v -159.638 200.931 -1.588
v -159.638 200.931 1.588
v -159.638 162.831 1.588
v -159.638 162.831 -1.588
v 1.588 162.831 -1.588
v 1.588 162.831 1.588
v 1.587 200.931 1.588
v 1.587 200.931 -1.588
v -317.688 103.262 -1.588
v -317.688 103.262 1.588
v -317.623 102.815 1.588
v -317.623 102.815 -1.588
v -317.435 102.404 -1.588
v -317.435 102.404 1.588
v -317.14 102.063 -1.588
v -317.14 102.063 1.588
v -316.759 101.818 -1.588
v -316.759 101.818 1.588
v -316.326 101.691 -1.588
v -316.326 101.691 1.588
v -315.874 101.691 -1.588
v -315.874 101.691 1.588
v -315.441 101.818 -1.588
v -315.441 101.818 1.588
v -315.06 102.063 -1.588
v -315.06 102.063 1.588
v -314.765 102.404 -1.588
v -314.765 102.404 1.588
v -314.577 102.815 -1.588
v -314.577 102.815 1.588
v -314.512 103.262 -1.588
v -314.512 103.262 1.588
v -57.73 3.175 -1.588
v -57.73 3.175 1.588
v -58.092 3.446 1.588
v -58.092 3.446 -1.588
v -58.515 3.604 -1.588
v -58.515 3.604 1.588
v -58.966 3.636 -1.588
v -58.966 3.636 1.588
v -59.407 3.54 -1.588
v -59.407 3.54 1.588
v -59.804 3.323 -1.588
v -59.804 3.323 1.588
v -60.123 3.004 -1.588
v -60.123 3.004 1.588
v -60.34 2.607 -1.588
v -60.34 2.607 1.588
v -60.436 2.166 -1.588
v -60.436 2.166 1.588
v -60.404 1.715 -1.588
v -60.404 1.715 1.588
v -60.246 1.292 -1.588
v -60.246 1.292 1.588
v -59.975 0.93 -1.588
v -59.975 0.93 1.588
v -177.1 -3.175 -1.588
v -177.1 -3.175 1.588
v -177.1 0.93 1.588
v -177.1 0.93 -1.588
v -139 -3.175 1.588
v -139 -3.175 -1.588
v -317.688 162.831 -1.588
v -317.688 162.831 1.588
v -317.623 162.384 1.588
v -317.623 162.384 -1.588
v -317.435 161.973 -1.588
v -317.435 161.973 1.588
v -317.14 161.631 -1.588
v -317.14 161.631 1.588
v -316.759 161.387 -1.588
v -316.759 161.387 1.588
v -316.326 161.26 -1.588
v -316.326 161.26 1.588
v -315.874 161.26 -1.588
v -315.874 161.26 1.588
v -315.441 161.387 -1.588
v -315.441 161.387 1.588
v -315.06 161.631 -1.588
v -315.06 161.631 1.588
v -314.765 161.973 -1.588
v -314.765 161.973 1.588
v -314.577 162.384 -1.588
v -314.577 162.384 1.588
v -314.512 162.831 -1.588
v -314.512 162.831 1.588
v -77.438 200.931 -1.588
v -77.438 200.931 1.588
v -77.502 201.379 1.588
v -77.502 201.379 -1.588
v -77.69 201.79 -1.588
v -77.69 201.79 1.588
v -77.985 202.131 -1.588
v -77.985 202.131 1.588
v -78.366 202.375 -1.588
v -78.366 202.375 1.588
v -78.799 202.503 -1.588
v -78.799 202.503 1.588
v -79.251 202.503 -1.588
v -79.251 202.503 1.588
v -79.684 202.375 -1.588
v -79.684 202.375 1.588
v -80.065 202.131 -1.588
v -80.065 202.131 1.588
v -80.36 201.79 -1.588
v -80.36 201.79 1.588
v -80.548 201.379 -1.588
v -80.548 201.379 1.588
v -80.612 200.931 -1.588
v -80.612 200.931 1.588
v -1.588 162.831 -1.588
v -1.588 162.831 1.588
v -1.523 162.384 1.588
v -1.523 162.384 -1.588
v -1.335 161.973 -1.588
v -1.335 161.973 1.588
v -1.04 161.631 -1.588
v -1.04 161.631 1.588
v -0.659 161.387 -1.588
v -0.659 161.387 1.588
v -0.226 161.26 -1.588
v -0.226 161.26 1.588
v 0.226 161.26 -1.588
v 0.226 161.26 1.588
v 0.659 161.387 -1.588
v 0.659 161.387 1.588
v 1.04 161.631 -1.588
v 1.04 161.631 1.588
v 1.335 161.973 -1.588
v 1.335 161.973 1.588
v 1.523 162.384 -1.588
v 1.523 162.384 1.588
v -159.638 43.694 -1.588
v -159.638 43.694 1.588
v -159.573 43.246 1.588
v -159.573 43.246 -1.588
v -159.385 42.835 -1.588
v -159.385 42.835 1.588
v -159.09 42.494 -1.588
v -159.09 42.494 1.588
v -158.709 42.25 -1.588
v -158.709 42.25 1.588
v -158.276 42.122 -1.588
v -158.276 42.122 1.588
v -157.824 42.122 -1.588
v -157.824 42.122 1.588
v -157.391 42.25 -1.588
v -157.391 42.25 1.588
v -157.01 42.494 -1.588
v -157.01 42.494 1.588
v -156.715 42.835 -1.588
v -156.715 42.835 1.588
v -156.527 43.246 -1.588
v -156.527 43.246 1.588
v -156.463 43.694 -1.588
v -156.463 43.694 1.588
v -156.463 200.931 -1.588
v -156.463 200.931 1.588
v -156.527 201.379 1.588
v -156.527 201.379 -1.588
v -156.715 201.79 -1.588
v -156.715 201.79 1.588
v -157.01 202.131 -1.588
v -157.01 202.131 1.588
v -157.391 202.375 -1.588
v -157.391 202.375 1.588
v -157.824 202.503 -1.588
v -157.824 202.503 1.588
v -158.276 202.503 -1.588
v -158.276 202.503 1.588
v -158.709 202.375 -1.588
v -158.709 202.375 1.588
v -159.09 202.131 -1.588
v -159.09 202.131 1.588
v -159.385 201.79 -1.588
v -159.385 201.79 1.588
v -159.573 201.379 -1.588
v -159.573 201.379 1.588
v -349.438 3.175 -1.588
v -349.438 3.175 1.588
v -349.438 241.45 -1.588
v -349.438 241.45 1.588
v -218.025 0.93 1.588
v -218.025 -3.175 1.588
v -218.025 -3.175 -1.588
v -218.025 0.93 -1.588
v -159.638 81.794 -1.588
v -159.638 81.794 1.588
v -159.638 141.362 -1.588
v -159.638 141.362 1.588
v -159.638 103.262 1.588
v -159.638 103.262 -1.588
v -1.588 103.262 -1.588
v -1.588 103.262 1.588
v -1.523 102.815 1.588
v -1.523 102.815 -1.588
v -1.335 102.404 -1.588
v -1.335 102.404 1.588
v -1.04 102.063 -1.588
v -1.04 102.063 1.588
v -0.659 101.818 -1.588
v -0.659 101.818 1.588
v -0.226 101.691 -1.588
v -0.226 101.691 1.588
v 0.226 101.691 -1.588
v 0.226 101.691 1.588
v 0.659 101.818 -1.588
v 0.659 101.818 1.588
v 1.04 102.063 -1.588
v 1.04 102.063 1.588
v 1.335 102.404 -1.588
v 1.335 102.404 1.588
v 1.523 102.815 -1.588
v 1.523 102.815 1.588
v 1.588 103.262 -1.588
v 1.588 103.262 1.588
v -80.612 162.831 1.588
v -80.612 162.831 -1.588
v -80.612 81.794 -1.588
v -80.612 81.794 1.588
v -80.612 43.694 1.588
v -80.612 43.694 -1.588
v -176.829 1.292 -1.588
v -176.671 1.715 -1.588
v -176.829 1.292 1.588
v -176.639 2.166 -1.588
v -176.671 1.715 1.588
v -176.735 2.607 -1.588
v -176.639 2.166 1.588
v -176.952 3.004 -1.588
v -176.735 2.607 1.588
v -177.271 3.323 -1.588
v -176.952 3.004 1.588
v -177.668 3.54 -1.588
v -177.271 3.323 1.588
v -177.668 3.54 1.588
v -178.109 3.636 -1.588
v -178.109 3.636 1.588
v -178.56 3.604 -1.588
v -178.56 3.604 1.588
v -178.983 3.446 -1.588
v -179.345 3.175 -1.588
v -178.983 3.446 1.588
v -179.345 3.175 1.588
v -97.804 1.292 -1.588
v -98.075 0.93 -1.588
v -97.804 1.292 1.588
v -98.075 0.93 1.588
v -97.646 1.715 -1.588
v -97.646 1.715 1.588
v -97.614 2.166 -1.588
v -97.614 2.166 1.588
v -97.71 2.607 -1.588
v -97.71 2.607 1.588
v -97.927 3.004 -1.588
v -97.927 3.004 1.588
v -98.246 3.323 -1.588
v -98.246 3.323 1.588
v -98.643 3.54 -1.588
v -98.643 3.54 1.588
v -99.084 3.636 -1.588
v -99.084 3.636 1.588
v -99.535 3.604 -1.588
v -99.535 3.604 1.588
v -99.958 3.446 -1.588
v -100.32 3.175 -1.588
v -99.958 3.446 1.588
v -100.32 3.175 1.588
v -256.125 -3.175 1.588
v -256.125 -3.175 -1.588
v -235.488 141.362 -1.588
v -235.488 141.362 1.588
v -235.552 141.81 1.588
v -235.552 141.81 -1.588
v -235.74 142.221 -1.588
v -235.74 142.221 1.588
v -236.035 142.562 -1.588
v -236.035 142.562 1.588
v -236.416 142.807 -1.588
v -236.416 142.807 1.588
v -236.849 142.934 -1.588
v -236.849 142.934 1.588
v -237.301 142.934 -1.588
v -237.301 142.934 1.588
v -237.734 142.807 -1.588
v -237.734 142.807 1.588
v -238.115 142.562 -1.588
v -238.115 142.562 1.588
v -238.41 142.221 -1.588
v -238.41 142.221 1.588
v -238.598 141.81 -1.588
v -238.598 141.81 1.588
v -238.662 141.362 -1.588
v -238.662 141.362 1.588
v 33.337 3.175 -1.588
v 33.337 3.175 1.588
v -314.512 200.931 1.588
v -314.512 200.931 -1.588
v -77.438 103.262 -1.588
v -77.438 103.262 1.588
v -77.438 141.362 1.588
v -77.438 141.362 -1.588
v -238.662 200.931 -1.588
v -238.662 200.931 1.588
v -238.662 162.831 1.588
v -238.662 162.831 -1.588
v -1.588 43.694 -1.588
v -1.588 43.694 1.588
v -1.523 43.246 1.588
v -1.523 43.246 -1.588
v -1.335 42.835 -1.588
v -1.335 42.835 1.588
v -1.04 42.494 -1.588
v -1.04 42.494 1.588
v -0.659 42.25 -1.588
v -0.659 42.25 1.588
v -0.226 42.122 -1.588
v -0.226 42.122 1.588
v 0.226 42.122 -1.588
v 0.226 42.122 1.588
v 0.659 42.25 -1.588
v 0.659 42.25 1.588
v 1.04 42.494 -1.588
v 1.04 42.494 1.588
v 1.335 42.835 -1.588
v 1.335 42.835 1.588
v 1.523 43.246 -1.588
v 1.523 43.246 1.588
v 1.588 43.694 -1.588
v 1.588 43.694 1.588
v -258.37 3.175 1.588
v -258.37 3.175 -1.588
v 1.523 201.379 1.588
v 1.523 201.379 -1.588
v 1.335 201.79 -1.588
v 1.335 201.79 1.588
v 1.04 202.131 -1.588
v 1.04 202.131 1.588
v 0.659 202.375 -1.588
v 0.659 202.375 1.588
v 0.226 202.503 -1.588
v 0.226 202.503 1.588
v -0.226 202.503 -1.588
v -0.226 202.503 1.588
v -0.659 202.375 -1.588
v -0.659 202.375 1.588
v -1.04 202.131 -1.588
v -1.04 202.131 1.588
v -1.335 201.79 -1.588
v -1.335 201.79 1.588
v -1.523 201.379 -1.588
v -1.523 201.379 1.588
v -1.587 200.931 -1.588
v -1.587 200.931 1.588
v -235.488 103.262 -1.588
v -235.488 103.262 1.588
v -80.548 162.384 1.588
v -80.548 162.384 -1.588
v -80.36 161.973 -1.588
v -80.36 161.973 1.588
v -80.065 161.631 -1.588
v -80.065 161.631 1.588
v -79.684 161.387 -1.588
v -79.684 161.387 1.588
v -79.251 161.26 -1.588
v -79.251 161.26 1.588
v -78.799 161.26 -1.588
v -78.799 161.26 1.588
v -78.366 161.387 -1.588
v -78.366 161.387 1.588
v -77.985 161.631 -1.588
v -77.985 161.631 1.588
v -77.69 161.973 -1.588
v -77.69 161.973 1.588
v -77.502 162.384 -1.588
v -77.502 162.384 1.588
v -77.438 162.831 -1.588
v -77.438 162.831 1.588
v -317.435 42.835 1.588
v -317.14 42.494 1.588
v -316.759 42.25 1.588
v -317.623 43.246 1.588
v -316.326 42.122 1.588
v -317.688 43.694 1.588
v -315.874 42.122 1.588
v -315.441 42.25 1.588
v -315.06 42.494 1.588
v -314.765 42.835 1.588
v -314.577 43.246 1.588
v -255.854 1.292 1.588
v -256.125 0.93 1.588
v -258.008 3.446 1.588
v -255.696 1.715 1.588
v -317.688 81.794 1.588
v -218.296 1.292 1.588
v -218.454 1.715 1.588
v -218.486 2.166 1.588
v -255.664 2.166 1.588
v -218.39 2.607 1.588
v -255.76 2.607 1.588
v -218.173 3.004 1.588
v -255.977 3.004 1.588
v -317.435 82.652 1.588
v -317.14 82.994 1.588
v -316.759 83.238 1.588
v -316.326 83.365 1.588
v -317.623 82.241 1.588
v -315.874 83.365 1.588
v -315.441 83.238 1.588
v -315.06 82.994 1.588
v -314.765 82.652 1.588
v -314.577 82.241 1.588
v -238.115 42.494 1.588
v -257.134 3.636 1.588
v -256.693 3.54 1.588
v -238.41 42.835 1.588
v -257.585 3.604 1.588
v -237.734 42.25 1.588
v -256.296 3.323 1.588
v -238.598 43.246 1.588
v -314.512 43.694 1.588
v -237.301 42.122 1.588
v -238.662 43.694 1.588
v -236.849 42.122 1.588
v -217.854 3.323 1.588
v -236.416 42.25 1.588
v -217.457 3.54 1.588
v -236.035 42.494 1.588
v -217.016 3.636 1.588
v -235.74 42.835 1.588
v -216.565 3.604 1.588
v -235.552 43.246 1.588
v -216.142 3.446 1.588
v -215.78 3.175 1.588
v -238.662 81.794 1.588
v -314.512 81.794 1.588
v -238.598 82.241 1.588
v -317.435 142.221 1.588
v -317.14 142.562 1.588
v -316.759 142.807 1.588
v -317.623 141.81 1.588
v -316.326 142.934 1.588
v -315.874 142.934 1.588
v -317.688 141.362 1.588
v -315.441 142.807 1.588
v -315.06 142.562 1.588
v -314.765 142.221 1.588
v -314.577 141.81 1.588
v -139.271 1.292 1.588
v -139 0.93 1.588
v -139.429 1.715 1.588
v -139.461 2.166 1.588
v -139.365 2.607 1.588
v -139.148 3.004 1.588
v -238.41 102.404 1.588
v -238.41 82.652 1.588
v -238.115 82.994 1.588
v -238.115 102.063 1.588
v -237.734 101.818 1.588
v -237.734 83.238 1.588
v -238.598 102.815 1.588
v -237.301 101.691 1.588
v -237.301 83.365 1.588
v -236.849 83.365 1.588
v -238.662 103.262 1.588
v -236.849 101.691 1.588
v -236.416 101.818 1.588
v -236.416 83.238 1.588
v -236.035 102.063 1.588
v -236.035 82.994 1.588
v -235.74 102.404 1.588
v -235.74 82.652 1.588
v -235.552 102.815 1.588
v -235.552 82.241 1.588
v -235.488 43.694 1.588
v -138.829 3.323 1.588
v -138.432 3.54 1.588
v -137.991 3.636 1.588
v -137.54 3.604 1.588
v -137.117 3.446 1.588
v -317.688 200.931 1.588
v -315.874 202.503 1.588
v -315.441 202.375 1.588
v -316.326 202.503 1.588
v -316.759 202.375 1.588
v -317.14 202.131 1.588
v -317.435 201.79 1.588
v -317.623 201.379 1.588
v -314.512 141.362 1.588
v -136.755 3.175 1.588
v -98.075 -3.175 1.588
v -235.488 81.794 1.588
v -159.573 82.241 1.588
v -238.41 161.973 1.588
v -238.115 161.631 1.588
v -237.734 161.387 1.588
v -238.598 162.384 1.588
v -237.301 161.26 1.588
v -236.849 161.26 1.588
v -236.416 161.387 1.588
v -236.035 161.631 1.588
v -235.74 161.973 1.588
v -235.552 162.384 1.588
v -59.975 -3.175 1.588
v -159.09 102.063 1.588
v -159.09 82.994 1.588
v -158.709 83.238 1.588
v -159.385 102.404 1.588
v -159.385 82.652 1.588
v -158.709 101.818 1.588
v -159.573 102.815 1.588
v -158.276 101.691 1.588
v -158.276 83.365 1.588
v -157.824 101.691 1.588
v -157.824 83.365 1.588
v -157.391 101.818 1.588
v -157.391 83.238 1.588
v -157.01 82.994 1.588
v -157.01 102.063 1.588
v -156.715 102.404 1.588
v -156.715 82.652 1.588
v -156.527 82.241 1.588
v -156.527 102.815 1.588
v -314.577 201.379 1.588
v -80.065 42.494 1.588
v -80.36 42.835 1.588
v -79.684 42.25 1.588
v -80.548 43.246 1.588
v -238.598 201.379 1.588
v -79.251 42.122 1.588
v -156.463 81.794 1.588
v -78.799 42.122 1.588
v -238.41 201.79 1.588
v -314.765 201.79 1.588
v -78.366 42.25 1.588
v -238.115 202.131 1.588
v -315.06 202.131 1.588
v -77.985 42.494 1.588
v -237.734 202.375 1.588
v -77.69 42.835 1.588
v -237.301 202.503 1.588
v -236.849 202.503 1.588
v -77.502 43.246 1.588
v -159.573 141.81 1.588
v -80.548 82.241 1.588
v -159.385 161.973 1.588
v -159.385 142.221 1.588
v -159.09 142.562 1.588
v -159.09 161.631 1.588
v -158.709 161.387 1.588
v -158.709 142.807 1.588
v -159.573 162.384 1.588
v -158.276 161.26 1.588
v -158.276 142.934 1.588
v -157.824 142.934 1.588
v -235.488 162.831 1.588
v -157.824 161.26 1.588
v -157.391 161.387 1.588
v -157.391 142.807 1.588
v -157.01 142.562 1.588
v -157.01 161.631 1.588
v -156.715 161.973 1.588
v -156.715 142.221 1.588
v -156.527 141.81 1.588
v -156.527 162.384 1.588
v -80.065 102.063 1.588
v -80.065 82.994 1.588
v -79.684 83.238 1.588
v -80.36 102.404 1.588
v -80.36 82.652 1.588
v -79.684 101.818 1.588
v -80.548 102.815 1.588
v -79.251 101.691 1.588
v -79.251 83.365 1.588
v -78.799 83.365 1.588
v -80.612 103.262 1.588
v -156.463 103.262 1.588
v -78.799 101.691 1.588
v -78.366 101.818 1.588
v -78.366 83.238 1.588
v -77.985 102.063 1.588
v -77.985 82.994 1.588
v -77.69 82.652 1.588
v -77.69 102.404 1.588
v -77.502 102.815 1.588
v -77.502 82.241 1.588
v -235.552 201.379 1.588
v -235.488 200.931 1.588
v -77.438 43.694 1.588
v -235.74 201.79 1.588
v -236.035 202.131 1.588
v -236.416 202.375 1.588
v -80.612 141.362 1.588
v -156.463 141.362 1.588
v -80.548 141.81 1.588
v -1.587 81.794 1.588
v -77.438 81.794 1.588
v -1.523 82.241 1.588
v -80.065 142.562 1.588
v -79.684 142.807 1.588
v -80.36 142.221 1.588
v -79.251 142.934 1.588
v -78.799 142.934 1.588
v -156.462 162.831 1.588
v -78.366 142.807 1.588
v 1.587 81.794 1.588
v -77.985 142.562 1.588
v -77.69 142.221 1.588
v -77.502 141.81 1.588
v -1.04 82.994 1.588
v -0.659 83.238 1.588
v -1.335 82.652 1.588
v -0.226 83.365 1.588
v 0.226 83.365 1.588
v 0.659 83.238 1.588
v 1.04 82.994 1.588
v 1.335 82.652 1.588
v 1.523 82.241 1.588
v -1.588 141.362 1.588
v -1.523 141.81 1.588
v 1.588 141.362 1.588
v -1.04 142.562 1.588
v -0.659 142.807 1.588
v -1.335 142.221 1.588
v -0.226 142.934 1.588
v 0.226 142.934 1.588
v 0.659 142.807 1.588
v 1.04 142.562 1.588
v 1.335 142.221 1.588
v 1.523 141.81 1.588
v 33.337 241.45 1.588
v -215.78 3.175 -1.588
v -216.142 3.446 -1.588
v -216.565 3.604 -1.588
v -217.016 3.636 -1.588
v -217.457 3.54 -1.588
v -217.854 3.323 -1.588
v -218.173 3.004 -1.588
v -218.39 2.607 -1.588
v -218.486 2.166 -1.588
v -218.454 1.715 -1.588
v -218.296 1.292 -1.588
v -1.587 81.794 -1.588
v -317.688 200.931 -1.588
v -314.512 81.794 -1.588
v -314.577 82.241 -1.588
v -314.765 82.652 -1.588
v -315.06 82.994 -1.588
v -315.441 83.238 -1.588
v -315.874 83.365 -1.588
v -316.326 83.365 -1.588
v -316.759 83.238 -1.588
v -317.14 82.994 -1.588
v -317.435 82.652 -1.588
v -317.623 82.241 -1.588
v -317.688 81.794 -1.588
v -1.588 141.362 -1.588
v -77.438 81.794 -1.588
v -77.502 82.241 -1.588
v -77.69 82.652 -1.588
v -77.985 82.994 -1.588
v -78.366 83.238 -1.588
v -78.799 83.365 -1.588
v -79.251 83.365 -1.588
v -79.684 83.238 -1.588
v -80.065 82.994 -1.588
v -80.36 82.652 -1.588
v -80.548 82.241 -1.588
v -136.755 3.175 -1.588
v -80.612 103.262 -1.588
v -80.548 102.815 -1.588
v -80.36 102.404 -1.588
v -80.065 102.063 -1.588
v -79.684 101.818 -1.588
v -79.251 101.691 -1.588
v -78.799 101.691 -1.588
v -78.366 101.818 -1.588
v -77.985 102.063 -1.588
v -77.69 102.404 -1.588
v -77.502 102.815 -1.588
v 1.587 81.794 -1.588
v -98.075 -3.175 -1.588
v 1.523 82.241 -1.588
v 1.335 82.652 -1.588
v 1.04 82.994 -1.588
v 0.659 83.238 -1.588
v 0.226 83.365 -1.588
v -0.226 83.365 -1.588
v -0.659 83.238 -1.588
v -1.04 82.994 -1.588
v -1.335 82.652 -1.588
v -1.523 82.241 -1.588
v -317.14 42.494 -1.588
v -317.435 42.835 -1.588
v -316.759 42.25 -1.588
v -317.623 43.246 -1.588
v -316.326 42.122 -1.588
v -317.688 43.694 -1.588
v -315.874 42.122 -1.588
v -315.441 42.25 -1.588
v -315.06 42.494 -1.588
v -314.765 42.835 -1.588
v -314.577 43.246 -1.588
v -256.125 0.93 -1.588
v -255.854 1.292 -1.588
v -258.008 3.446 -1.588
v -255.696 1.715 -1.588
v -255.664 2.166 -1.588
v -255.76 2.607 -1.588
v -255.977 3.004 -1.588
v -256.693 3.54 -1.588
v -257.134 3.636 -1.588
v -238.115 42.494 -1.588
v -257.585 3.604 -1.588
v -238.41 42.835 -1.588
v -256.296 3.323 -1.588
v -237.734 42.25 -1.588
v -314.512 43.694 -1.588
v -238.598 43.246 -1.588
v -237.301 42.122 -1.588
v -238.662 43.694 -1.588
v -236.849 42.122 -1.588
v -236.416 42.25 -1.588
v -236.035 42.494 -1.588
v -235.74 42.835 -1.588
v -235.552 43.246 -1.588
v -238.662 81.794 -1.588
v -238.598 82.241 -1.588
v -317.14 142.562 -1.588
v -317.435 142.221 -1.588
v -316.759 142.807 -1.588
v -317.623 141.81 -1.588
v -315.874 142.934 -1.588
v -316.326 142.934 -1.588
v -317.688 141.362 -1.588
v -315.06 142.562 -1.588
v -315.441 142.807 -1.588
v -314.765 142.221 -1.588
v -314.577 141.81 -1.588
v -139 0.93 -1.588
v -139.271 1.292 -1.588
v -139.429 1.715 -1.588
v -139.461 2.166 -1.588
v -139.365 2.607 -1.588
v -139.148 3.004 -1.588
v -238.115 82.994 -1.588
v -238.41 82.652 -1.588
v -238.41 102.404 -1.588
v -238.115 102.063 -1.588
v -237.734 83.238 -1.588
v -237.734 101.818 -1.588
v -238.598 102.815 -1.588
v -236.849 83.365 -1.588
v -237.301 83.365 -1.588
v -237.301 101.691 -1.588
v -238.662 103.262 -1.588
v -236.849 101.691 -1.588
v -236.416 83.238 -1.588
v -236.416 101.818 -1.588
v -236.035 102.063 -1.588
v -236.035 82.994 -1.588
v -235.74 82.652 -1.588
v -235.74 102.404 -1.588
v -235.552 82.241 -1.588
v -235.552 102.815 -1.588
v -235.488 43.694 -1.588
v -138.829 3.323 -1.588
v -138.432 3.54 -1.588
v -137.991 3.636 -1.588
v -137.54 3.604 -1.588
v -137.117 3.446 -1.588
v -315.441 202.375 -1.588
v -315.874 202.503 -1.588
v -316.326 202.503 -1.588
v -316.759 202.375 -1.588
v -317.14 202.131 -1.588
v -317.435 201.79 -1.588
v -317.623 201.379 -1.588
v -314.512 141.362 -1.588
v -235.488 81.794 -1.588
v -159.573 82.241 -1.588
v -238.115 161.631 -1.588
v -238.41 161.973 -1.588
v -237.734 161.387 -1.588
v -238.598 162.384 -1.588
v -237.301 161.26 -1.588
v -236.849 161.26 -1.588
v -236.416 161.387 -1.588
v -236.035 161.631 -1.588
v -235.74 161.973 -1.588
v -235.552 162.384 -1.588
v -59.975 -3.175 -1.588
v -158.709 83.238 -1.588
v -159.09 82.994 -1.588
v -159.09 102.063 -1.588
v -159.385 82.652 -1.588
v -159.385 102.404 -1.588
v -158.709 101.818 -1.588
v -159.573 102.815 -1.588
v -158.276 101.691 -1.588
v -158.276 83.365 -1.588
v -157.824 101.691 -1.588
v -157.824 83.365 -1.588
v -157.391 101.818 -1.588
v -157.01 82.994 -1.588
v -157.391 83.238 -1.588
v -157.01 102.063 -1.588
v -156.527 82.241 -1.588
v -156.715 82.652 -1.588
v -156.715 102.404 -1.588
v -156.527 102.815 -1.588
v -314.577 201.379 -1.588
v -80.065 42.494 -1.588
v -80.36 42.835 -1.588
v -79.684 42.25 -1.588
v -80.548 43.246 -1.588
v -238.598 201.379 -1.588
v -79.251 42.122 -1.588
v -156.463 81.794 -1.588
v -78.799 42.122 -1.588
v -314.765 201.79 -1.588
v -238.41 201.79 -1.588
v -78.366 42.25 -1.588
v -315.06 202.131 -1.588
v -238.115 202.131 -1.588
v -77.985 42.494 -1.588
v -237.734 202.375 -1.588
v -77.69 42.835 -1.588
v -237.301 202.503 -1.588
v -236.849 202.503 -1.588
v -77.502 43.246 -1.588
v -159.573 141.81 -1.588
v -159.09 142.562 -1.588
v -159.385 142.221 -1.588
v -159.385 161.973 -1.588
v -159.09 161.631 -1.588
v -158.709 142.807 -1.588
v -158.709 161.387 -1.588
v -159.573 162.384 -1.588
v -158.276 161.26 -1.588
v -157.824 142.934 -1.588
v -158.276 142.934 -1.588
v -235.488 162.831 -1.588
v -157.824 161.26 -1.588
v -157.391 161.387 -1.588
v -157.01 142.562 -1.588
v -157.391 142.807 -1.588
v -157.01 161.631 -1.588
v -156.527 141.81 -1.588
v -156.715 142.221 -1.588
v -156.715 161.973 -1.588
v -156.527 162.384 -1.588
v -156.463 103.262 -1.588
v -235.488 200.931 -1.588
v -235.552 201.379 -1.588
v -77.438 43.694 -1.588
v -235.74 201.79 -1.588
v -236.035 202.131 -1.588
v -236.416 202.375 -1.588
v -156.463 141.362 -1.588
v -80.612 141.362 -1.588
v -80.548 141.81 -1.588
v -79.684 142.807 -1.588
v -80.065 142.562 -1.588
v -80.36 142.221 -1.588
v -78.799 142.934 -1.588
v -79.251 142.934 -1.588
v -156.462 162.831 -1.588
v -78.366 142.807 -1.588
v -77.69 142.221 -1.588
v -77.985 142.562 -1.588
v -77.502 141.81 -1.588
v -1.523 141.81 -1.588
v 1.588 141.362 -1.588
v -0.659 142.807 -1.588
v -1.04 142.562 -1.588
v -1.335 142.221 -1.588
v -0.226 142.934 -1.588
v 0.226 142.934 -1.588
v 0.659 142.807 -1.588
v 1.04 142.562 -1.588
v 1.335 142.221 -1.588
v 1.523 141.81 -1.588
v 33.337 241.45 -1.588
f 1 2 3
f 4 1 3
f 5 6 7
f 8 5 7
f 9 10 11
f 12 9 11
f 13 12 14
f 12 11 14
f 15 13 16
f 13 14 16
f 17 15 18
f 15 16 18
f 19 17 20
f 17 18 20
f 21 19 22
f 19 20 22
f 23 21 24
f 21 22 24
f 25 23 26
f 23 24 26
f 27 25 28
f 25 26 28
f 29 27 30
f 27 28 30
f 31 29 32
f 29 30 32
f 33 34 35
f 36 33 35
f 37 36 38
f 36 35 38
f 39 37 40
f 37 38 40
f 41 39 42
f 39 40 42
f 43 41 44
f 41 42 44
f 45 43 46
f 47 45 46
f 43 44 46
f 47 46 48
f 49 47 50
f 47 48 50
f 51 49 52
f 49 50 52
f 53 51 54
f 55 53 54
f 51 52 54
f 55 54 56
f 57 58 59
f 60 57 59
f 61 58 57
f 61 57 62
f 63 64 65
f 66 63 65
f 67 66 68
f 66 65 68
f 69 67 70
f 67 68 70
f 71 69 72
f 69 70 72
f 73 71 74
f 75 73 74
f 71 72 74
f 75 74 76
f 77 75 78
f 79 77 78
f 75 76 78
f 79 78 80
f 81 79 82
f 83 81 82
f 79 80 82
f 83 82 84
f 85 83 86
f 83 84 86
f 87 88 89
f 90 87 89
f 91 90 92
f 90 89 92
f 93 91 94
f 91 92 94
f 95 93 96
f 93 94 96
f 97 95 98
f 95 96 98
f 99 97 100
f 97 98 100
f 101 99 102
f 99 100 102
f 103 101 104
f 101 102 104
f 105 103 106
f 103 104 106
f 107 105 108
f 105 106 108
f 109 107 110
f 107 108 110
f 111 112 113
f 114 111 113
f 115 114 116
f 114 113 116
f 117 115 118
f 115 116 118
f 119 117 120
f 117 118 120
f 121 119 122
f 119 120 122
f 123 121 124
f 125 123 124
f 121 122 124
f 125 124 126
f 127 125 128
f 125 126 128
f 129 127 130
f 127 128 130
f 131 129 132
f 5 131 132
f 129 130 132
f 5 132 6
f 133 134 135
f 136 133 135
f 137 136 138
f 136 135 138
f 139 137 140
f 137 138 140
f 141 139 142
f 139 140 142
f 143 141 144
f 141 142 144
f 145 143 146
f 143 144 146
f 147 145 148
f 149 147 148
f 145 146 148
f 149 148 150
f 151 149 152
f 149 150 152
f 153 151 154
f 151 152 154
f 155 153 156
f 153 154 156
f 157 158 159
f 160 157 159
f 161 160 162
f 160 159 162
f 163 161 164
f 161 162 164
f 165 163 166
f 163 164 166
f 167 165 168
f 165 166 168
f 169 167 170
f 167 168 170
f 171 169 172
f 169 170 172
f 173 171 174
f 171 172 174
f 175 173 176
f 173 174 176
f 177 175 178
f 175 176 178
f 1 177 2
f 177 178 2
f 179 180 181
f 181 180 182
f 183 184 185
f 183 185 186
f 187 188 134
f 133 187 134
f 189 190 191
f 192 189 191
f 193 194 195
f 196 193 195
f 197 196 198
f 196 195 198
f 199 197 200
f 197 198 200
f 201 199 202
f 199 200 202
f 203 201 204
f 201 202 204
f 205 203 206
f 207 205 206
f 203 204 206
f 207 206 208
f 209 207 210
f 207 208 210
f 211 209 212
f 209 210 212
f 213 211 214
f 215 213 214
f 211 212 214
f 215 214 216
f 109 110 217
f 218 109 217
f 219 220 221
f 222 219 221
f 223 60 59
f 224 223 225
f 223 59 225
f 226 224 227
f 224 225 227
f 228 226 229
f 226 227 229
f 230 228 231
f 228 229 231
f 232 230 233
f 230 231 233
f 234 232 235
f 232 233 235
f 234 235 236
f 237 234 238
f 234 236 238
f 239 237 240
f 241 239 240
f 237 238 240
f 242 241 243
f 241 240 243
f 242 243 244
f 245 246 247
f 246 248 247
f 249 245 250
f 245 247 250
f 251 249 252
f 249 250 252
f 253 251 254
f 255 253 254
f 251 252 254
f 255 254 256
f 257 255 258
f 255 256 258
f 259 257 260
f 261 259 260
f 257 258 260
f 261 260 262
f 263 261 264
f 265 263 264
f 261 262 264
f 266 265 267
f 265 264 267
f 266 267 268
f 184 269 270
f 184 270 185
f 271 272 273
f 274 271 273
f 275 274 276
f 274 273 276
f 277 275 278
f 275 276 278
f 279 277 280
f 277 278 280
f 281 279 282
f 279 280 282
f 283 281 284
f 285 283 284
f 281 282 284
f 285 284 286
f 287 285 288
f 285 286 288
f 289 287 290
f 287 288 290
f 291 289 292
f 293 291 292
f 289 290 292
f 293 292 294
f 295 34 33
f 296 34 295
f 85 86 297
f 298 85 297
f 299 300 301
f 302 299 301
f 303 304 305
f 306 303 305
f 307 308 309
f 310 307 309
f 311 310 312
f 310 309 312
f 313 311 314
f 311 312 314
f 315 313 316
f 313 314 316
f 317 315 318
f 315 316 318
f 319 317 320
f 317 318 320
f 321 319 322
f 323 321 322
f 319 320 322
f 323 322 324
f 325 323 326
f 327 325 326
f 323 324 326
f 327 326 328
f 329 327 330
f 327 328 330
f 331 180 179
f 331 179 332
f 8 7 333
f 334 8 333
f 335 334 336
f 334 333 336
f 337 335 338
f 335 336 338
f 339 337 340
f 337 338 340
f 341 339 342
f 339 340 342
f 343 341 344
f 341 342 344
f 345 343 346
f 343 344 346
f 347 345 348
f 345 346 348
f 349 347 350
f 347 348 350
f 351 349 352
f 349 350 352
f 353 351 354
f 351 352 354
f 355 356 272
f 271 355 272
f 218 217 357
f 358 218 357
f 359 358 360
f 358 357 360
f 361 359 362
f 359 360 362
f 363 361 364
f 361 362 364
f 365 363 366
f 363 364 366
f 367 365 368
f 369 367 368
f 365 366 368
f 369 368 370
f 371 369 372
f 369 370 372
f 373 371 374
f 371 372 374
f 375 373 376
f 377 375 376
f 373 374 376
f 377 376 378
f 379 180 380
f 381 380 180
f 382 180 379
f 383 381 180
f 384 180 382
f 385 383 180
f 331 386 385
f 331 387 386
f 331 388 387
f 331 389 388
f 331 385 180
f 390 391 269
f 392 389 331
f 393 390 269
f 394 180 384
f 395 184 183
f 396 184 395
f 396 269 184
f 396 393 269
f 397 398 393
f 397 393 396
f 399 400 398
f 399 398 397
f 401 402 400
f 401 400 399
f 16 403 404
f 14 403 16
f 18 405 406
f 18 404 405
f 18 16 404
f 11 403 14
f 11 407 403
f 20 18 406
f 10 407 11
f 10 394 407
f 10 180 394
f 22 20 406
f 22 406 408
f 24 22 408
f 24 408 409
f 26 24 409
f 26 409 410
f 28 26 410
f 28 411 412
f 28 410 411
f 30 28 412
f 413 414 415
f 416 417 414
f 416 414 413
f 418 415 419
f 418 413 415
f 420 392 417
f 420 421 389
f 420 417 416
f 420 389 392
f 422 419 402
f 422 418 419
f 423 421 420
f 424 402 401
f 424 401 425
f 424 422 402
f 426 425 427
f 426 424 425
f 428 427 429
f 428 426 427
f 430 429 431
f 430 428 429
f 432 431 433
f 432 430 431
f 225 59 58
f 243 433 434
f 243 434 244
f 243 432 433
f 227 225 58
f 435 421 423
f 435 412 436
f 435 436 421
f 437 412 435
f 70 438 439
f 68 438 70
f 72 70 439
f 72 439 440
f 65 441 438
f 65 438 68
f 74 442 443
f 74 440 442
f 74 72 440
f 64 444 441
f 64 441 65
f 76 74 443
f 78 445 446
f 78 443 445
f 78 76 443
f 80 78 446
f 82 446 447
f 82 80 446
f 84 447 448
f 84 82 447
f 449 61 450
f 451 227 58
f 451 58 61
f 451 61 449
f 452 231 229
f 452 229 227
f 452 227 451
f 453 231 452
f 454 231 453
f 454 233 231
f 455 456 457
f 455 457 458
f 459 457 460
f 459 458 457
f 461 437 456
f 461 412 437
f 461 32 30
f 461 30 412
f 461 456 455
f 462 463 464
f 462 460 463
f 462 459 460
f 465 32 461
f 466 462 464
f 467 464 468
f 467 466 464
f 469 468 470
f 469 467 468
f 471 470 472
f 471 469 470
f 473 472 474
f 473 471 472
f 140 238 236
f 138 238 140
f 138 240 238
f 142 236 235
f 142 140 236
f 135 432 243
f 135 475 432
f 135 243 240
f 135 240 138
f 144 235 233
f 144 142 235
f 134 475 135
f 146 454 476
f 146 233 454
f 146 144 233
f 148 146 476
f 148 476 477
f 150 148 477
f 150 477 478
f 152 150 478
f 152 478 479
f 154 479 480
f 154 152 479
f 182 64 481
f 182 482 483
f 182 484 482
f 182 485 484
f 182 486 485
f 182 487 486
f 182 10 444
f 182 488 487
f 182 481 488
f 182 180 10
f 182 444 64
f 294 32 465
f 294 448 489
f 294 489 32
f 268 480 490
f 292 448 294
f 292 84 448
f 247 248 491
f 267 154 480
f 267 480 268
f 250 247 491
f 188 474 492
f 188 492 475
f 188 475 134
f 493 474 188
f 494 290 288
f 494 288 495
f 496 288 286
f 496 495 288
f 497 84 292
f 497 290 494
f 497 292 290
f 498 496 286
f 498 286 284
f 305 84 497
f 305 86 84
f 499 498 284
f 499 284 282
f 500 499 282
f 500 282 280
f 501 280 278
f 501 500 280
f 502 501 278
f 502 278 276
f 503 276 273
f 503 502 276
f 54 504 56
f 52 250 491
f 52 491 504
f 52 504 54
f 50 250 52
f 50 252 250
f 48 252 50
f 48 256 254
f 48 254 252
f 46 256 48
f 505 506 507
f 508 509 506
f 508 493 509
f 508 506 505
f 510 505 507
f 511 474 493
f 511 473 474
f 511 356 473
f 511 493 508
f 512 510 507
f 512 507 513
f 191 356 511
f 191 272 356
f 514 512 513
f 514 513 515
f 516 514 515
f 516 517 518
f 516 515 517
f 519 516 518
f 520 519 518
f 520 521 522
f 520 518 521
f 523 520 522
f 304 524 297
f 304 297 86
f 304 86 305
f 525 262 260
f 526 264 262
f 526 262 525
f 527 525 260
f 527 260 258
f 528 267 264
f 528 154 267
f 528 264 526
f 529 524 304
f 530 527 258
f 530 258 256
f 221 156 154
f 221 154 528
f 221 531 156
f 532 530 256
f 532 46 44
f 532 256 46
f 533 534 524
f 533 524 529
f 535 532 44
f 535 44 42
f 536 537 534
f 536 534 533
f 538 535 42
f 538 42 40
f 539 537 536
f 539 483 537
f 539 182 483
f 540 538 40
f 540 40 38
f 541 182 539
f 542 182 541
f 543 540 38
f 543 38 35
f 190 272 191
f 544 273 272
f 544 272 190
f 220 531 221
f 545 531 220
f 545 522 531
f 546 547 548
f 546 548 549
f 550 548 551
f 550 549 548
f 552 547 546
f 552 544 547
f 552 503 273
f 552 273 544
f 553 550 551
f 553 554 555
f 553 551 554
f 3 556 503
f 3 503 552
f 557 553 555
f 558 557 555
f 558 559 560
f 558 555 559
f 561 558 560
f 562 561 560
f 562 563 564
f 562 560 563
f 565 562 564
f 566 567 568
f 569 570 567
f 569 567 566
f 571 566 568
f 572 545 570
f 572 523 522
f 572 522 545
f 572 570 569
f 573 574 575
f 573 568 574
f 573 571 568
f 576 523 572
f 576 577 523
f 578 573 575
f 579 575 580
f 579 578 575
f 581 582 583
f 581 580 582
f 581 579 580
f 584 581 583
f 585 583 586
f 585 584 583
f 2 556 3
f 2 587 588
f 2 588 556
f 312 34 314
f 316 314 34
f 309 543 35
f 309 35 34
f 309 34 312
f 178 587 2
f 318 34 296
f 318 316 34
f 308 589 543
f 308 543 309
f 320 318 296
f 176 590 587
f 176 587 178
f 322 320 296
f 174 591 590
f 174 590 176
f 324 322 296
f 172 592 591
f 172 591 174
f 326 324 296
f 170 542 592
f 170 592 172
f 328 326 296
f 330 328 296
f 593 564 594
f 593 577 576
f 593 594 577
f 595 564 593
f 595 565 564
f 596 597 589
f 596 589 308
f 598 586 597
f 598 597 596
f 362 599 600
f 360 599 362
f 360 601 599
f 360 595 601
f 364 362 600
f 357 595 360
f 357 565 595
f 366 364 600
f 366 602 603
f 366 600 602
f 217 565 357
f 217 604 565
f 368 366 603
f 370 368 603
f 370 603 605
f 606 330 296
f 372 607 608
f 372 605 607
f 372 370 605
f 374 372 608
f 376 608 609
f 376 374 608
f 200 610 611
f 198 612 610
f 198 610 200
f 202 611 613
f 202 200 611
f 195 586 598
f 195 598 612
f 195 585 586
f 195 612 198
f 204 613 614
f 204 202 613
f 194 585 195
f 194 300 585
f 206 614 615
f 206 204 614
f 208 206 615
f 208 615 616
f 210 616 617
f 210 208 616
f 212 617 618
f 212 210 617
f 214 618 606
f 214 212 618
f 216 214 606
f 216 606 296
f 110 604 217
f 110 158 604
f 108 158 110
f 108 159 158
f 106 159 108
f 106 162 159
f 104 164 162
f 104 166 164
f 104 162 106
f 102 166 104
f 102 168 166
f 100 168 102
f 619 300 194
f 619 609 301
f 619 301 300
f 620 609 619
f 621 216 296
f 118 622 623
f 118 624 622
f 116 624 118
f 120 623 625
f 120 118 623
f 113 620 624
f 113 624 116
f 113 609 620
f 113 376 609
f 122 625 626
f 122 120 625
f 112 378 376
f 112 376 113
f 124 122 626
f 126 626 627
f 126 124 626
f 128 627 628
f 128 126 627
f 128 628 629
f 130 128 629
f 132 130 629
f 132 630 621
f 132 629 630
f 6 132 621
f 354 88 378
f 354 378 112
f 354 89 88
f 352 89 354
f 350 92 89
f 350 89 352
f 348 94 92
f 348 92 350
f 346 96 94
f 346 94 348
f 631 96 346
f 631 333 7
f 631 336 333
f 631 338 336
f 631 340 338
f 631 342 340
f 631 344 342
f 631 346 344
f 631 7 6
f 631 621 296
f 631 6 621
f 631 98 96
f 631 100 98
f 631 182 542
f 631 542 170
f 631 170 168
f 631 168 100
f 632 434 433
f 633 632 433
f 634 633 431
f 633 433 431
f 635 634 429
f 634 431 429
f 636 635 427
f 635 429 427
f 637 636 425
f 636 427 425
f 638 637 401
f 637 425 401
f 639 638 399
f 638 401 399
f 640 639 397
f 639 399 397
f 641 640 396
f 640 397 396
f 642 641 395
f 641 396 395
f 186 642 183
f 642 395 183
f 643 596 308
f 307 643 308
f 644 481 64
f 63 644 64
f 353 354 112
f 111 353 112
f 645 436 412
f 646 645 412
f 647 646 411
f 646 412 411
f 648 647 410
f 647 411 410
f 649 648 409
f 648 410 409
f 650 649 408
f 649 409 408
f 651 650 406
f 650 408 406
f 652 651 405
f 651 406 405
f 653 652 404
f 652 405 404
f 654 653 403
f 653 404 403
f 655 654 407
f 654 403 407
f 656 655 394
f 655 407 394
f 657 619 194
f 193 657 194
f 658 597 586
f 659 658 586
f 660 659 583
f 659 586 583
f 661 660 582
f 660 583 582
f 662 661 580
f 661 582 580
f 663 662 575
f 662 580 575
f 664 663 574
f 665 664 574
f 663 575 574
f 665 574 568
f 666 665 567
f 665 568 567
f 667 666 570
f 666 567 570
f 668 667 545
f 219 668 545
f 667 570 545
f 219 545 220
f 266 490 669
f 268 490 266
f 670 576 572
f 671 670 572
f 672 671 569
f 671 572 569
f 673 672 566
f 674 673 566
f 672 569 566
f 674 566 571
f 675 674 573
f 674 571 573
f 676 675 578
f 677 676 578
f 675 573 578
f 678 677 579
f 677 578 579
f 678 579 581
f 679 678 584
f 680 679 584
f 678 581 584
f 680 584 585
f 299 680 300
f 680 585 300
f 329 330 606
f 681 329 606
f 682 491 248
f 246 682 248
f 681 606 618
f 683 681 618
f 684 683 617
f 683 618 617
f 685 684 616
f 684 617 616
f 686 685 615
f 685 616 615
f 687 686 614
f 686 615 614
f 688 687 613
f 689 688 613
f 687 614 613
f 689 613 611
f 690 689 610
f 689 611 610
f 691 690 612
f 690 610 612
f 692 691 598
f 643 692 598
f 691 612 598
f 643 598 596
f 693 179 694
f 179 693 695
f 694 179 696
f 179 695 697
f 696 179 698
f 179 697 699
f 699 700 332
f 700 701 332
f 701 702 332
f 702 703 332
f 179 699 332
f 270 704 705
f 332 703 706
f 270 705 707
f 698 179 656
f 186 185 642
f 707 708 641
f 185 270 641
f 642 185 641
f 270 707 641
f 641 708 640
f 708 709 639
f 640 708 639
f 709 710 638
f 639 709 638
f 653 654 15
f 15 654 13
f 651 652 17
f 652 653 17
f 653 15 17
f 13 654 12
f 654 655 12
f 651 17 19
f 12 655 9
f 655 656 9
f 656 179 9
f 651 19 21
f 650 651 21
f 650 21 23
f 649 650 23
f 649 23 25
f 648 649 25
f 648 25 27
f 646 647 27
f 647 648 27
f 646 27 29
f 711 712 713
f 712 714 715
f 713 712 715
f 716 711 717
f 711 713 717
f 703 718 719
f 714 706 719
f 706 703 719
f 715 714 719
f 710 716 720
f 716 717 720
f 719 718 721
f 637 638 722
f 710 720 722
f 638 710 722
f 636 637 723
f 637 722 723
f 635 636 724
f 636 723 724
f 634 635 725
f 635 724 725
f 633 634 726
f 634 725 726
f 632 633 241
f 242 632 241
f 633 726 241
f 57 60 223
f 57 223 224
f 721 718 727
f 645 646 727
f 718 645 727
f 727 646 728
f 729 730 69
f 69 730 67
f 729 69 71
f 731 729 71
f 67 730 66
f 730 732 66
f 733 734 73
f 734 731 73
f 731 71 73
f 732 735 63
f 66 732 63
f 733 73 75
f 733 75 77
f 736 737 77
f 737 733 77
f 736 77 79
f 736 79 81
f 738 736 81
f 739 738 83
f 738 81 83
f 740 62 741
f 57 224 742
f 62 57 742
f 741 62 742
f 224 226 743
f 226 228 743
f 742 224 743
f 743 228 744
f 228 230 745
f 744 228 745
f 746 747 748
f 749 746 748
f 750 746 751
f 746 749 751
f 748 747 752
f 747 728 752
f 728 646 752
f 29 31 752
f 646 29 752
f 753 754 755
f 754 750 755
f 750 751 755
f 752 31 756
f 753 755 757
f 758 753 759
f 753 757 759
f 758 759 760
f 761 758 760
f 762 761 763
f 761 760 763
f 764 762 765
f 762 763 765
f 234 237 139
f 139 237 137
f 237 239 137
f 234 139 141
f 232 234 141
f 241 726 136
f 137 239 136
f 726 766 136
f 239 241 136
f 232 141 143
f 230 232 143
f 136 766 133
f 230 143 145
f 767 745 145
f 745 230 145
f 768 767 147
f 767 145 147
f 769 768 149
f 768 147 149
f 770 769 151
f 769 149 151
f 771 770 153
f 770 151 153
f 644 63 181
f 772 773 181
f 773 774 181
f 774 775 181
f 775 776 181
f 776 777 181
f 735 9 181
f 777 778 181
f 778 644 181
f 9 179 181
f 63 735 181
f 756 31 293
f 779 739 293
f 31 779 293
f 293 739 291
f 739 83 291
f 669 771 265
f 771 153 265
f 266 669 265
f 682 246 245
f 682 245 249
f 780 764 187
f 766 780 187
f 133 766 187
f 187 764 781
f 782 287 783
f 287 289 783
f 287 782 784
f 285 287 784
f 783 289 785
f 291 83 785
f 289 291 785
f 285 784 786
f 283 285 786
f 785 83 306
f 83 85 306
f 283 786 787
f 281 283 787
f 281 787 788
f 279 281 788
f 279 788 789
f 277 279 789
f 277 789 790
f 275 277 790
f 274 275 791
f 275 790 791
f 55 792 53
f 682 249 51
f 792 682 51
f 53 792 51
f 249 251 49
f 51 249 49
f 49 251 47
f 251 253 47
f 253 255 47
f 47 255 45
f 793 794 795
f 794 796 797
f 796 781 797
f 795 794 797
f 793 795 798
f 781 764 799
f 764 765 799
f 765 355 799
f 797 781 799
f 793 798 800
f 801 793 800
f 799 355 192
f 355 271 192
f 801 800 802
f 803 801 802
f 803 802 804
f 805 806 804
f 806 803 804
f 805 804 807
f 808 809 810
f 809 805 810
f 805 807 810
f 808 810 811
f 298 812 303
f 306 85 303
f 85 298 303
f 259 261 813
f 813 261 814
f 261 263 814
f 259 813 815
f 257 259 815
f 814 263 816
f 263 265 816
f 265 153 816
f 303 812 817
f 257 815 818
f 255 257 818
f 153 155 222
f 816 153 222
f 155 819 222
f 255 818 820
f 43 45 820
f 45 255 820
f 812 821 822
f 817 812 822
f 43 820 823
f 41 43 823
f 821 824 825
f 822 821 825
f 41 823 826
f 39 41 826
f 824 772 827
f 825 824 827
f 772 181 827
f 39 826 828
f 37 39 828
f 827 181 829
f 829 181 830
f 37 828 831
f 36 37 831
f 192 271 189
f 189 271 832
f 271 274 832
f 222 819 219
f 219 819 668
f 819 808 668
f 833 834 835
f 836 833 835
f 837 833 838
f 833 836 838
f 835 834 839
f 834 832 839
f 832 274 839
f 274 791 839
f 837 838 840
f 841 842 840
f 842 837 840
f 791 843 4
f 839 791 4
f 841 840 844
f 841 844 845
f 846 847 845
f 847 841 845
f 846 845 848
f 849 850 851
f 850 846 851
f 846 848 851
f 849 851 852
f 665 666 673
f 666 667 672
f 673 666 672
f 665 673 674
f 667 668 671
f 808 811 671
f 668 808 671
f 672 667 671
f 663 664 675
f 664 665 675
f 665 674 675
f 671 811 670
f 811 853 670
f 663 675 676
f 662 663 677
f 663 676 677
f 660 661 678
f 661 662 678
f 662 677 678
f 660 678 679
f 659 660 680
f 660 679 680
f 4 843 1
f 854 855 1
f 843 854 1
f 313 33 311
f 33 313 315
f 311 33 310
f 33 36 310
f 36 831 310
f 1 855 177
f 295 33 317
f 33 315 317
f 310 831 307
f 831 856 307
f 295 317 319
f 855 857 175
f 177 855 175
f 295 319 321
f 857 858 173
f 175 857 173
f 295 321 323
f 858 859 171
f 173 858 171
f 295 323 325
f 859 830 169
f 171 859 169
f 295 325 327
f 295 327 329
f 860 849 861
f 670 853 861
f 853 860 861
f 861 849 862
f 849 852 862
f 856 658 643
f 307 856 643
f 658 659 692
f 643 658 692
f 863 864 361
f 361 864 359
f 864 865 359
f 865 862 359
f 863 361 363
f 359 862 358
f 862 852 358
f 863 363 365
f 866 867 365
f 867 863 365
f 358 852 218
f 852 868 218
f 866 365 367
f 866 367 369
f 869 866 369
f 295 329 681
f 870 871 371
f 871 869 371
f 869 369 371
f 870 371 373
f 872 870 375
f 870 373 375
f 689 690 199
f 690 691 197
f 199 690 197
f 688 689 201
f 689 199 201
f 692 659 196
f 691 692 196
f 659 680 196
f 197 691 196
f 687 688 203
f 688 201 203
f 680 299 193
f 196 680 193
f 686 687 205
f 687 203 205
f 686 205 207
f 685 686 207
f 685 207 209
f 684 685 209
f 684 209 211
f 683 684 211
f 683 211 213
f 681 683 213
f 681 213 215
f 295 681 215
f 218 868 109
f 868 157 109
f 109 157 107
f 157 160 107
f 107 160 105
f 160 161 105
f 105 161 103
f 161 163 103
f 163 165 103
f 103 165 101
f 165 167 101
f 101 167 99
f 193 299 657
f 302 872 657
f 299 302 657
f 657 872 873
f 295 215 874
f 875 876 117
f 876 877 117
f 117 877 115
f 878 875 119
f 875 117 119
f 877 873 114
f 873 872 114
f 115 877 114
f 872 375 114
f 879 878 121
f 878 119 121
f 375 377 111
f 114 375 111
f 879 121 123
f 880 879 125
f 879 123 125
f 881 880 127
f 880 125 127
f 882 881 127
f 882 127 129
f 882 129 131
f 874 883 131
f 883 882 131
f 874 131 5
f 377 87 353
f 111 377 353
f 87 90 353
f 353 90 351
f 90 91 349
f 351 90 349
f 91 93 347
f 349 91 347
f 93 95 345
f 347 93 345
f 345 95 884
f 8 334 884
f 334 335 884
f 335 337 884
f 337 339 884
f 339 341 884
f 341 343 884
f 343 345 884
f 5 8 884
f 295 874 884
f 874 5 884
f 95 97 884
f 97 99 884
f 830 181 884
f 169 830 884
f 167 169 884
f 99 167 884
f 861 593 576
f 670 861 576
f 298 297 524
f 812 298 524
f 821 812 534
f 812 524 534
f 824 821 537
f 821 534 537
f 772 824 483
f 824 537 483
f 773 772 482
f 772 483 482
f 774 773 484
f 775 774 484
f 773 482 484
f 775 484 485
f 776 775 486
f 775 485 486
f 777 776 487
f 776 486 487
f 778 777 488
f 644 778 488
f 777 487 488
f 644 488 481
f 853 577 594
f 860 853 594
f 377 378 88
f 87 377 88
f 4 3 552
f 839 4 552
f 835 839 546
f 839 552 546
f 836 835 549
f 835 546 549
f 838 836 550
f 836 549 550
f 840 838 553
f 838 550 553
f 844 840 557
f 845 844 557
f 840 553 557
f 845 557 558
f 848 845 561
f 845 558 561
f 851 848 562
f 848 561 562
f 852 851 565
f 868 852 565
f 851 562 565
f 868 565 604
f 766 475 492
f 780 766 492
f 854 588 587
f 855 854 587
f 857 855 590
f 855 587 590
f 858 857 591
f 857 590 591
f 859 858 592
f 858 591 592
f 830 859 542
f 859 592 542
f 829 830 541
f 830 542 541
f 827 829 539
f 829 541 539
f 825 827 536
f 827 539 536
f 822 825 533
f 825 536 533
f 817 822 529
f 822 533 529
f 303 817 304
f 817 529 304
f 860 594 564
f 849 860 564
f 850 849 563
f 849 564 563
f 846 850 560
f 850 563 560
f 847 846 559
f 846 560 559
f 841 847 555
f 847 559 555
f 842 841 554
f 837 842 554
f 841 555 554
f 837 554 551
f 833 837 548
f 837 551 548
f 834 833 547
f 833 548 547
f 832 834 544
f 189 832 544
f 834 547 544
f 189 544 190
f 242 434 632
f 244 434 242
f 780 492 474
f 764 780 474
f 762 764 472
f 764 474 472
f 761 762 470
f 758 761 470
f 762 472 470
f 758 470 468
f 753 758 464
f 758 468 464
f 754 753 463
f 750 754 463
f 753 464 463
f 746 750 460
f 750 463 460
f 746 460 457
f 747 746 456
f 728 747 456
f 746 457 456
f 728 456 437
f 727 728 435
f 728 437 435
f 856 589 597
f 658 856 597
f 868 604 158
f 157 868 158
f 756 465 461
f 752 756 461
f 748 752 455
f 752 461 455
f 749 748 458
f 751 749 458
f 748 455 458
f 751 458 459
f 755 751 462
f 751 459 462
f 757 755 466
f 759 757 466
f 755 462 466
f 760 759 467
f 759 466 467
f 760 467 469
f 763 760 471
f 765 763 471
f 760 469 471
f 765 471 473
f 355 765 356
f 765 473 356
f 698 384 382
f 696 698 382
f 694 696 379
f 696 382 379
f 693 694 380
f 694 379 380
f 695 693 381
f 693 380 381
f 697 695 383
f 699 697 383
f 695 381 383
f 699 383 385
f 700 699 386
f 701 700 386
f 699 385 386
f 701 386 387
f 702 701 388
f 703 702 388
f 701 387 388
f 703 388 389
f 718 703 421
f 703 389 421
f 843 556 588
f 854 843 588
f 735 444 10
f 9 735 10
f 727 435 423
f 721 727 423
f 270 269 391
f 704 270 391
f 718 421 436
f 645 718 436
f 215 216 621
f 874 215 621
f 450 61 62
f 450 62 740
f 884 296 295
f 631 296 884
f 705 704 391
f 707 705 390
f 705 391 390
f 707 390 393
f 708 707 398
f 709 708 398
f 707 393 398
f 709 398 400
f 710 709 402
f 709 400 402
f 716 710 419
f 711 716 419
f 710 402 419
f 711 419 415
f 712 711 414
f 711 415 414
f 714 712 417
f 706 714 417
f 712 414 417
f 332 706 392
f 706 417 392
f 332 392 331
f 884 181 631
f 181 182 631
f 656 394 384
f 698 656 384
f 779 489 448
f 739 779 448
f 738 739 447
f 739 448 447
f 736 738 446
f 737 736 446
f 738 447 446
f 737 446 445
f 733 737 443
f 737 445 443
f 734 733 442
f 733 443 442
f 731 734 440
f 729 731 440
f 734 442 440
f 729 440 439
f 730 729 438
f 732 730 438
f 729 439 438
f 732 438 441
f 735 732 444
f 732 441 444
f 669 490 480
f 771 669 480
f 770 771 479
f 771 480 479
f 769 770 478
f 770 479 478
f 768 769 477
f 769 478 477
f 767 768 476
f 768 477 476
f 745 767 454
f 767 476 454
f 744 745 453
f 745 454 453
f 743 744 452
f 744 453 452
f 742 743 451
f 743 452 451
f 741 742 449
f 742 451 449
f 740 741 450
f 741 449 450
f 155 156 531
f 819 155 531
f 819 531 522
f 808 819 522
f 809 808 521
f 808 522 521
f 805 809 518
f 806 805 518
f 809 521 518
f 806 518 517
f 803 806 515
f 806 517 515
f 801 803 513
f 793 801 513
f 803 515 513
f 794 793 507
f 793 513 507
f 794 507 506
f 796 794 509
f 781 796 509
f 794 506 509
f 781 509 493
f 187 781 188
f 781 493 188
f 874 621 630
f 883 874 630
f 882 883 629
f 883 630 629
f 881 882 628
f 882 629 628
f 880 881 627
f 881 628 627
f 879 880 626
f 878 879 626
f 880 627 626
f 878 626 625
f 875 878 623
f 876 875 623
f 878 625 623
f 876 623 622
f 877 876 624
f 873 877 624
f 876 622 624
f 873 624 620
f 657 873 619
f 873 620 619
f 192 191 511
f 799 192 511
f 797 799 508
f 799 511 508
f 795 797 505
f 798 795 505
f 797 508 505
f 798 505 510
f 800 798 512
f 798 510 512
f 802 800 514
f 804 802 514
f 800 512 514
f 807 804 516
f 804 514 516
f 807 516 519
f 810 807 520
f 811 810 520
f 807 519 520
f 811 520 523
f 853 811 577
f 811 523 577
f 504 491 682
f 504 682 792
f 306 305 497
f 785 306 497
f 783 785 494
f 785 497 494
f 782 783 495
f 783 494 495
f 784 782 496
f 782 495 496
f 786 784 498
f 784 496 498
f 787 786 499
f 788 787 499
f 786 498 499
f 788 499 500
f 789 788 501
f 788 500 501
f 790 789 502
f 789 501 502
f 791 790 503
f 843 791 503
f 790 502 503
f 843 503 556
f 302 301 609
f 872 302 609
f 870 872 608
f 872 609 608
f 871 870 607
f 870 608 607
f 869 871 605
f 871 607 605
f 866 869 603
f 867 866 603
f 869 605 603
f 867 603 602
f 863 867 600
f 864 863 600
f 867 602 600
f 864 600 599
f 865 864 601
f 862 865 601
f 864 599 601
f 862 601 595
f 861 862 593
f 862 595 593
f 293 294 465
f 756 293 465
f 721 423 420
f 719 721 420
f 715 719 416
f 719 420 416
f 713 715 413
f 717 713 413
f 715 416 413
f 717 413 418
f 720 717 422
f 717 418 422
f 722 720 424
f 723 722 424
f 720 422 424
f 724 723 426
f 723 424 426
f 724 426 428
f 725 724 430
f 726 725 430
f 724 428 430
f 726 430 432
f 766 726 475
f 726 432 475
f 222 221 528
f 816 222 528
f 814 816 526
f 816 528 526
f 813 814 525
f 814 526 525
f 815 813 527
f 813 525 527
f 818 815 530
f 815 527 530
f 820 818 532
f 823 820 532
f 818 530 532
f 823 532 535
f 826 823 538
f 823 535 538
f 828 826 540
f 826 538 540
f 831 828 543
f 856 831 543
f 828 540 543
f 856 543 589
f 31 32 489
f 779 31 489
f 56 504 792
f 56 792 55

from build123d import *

# Parameters (mm, degrees)
SKETCH1_W                     = 382.775
SKETCH1_H                     = 238.275
BOSS_EXTRUDE1_DEPTH           = 1.5875
SKETCH3_W                     = 38.1
SKETCH3_H                     = 6.35
WELD_TABS_EXTRUDE_DEPTH       = 3.175
SKETCH4_R                     = 1.5875
WELD_TABS_TEAR_DROP_CUT_DEPTH = 3.175
WELD_TABS_CUTOUT_DEPTH        = 3.175


with BuildPart() as part:
    # Sketch1 → Boss-Extrude1 (new body, symmetric)
    with BuildSketch(Plane.XY):
        with Locations((-158.05, 122.3125)):
            Rectangle(SKETCH1_W, SKETCH1_H)
    extrude(amount=BOSS_EXTRUDE1_DEPTH, both=True)

    # Sketch3 → Weld Tabs Extrude (add)
    with BuildSketch(Plane.XY.offset(1.5875)):
        with Locations((-237.075, 0)):
            Rectangle(SKETCH3_W, SKETCH3_H)
        with Locations((-158.05, 0)):
            Rectangle(SKETCH3_W, SKETCH3_H)
        with Locations((-79.025, 0)):
            Rectangle(SKETCH3_W, SKETCH3_H)
    extrude(amount=-WELD_TABS_EXTRUDE_DEPTH)

    # Sketch4 → Weld Tabs Tear Drop Cut (cut)
    with BuildSketch(Plane.XY.offset(1.5875)):
        with Locations((-257.247532015, 2.052467985)):
            Circle(SKETCH4_R)
        with Locations((-216.902467985, 2.052467985)):
            Circle(SKETCH4_R)
        with Locations((-178.222532015, 2.052467985)):
            Circle(SKETCH4_R)
        with Locations((-137.877467985, 2.052467985)):
            Circle(SKETCH4_R)
        with Locations((-99.197532015, 2.052467985)):
            Circle(SKETCH4_R)
        with Locations((-58.852467985, 2.052467985)):
            Circle(SKETCH4_R)
    extrude(amount=-WELD_TABS_TEAR_DROP_CUT_DEPTH, mode=Mode.SUBTRACT)

    # Sketch6 → Weld Tabs Cutout (cut)
    with BuildSketch(Plane.XY.offset(1.5875)):
        with BuildLine():
            Line((-238.6625, 200.93125), (-238.6625, 162.83125))
            ThreePointArc((-238.6625, 162.83125), (-237.075, 161.24375), (-235.4875, 162.83125))
            Line((-235.4875, 162.83125), (-235.4875, 200.93125))
            ThreePointArc((-235.4875, 200.93125), (-237.075, 202.51875), (-238.6625, 200.93125))
        make_face()
        with BuildLine():
            Line((-317.6875, 200.93125), (-317.6875, 162.83125))
            ThreePointArc((-317.6875, 162.83125), (-316.1, 161.24375), (-314.5125, 162.83125))
            Line((-314.5125, 162.83125), (-314.5125, 200.93125))
            ThreePointArc((-314.5125, 200.93125), (-316.1, 202.51875), (-317.6875, 200.93125))
        make_face()
        with BuildLine():
            Line((-159.6375, 200.93125), (-159.6375, 162.83125))
            ThreePointArc((-159.6375, 162.83125), (-158.05, 161.24375), (-156.4625, 162.83125))
            Line((-156.4625, 162.83125), (-156.4625, 200.93125))
            ThreePointArc((-156.4625, 200.93125), (-158.05, 202.51875), (-159.6375, 200.93125))
        make_face()
        with BuildLine():
            Line((-80.6125, 200.93125), (-80.6125, 162.83125))
            ThreePointArc((-80.6125, 162.83125), (-79.025, 161.24375), (-77.4375, 162.83125))
            Line((-77.4375, 162.83125), (-77.4375, 200.93125))
            ThreePointArc((-77.4375, 200.93125), (-79.025, 202.51875), (-80.6125, 200.93125))
        make_face()
        with BuildLine():
            Line((-1.5875, 200.93125), (-1.5875, 162.83125))
            ThreePointArc((-1.5875, 162.83125), (0, 161.24375), (1.5875, 162.83125))
            Line((1.5875, 162.83125), (1.5875, 200.93125))
            ThreePointArc((1.5875, 200.93125), (0, 202.51875), (-1.5875, 200.93125))
        make_face()
        with BuildLine():
            Line((-238.6625, 141.3625), (-238.6625, 103.2625))
            ThreePointArc((-238.6625, 103.2625), (-237.075, 101.675), (-235.4875, 103.2625))
            Line((-235.4875, 103.2625), (-235.4875, 141.3625))
            ThreePointArc((-235.4875, 141.3625), (-237.075, 142.95), (-238.6625, 141.3625))
        make_face()
        with BuildLine():
            Line((-159.6375, 141.3625), (-159.6375, 103.2625))
            ThreePointArc((-159.6375, 103.2625), (-158.05, 101.675), (-156.4625, 103.2625))
            Line((-156.4625, 103.2625), (-156.4625, 141.3625))
            ThreePointArc((-156.4625, 141.3625), (-158.05, 142.95), (-159.6375, 141.3625))
        make_face()
        with BuildLine():
            Line((-80.6125, 141.3625), (-80.6125, 103.2625))
            ThreePointArc((-80.6125, 103.2625), (-79.025, 101.675), (-77.4375, 103.2625))
            Line((-77.4375, 103.2625), (-77.4375, 141.3625))
            ThreePointArc((-77.4375, 141.3625), (-79.025, 142.95), (-80.6125, 141.3625))
        make_face()
        with BuildLine():
            Line((-1.5875, 141.3625), (-1.5875, 103.2625))
            ThreePointArc((-1.5875, 103.2625), (0, 101.675), (1.5875, 103.2625))
            Line((1.5875, 103.2625), (1.5875, 141.3625))
            ThreePointArc((1.5875, 141.3625), (0, 142.95), (-1.5875, 141.3625))
        make_face()
        with BuildLine():
            Line((-238.6625, 81.79375), (-238.6625, 43.69375))
            ThreePointArc((-238.6625, 43.69375), (-237.075, 42.10625), (-235.4875, 43.69375))
            Line((-235.4875, 43.69375), (-235.4875, 81.79375))
            ThreePointArc((-235.4875, 81.79375), (-237.075, 83.38125), (-238.6625, 81.79375))
        make_face()
        with BuildLine():
            Line((-159.6375, 81.79375), (-159.6375, 43.69375))
            ThreePointArc((-159.6375, 43.69375), (-158.05, 42.10625), (-156.4625, 43.69375))
            Line((-156.4625, 43.69375), (-156.4625, 81.79375))
            ThreePointArc((-156.4625, 81.79375), (-158.05, 83.38125), (-159.6375, 81.79375))
        make_face()
        with BuildLine():
            Line((-80.6125, 81.79375), (-80.6125, 43.69375))
            ThreePointArc((-80.6125, 43.69375), (-79.025, 42.10625), (-77.4375, 43.69375))
            Line((-77.4375, 43.69375), (-77.4375, 81.79375))
            ThreePointArc((-77.4375, 81.79375), (-79.025, 83.38125), (-80.6125, 81.79375))
        make_face()
        with BuildLine():
            Line((-1.5875, 81.79375), (-1.5875, 43.69375))
            ThreePointArc((-1.5875, 43.69375), (0, 42.10625), (1.5875, 43.69375))
            Line((1.5875, 43.69375), (1.5875, 81.79375))
            ThreePointArc((1.5875, 81.79375), (0, 83.38125), (-1.5875, 81.79375))
        make_face()
        with BuildLine():
            Line((-317.6875, 141.3625), (-317.6875, 103.2625))
            ThreePointArc((-317.6875, 103.2625), (-316.1, 101.675), (-314.5125, 103.2625))
            Line((-314.5125, 103.2625), (-314.5125, 141.3625))
            ThreePointArc((-314.5125, 141.3625), (-316.1, 142.95), (-317.6875, 141.3625))
        make_face()
        with BuildLine():
            Line((-317.6875, 81.79375), (-317.6875, 43.69375))
            ThreePointArc((-317.6875, 43.69375), (-316.1, 42.10625), (-314.5125, 43.69375))
            Line((-314.5125, 43.69375), (-314.5125, 81.79375))
            ThreePointArc((-314.5125, 81.79375), (-316.1, 83.38125), (-317.6875, 81.79375))
        make_face()
    extrude(amount=-WELD_TABS_CUTOUT_DEPTH, mode=Mode.SUBTRACT)


solid = part.part
